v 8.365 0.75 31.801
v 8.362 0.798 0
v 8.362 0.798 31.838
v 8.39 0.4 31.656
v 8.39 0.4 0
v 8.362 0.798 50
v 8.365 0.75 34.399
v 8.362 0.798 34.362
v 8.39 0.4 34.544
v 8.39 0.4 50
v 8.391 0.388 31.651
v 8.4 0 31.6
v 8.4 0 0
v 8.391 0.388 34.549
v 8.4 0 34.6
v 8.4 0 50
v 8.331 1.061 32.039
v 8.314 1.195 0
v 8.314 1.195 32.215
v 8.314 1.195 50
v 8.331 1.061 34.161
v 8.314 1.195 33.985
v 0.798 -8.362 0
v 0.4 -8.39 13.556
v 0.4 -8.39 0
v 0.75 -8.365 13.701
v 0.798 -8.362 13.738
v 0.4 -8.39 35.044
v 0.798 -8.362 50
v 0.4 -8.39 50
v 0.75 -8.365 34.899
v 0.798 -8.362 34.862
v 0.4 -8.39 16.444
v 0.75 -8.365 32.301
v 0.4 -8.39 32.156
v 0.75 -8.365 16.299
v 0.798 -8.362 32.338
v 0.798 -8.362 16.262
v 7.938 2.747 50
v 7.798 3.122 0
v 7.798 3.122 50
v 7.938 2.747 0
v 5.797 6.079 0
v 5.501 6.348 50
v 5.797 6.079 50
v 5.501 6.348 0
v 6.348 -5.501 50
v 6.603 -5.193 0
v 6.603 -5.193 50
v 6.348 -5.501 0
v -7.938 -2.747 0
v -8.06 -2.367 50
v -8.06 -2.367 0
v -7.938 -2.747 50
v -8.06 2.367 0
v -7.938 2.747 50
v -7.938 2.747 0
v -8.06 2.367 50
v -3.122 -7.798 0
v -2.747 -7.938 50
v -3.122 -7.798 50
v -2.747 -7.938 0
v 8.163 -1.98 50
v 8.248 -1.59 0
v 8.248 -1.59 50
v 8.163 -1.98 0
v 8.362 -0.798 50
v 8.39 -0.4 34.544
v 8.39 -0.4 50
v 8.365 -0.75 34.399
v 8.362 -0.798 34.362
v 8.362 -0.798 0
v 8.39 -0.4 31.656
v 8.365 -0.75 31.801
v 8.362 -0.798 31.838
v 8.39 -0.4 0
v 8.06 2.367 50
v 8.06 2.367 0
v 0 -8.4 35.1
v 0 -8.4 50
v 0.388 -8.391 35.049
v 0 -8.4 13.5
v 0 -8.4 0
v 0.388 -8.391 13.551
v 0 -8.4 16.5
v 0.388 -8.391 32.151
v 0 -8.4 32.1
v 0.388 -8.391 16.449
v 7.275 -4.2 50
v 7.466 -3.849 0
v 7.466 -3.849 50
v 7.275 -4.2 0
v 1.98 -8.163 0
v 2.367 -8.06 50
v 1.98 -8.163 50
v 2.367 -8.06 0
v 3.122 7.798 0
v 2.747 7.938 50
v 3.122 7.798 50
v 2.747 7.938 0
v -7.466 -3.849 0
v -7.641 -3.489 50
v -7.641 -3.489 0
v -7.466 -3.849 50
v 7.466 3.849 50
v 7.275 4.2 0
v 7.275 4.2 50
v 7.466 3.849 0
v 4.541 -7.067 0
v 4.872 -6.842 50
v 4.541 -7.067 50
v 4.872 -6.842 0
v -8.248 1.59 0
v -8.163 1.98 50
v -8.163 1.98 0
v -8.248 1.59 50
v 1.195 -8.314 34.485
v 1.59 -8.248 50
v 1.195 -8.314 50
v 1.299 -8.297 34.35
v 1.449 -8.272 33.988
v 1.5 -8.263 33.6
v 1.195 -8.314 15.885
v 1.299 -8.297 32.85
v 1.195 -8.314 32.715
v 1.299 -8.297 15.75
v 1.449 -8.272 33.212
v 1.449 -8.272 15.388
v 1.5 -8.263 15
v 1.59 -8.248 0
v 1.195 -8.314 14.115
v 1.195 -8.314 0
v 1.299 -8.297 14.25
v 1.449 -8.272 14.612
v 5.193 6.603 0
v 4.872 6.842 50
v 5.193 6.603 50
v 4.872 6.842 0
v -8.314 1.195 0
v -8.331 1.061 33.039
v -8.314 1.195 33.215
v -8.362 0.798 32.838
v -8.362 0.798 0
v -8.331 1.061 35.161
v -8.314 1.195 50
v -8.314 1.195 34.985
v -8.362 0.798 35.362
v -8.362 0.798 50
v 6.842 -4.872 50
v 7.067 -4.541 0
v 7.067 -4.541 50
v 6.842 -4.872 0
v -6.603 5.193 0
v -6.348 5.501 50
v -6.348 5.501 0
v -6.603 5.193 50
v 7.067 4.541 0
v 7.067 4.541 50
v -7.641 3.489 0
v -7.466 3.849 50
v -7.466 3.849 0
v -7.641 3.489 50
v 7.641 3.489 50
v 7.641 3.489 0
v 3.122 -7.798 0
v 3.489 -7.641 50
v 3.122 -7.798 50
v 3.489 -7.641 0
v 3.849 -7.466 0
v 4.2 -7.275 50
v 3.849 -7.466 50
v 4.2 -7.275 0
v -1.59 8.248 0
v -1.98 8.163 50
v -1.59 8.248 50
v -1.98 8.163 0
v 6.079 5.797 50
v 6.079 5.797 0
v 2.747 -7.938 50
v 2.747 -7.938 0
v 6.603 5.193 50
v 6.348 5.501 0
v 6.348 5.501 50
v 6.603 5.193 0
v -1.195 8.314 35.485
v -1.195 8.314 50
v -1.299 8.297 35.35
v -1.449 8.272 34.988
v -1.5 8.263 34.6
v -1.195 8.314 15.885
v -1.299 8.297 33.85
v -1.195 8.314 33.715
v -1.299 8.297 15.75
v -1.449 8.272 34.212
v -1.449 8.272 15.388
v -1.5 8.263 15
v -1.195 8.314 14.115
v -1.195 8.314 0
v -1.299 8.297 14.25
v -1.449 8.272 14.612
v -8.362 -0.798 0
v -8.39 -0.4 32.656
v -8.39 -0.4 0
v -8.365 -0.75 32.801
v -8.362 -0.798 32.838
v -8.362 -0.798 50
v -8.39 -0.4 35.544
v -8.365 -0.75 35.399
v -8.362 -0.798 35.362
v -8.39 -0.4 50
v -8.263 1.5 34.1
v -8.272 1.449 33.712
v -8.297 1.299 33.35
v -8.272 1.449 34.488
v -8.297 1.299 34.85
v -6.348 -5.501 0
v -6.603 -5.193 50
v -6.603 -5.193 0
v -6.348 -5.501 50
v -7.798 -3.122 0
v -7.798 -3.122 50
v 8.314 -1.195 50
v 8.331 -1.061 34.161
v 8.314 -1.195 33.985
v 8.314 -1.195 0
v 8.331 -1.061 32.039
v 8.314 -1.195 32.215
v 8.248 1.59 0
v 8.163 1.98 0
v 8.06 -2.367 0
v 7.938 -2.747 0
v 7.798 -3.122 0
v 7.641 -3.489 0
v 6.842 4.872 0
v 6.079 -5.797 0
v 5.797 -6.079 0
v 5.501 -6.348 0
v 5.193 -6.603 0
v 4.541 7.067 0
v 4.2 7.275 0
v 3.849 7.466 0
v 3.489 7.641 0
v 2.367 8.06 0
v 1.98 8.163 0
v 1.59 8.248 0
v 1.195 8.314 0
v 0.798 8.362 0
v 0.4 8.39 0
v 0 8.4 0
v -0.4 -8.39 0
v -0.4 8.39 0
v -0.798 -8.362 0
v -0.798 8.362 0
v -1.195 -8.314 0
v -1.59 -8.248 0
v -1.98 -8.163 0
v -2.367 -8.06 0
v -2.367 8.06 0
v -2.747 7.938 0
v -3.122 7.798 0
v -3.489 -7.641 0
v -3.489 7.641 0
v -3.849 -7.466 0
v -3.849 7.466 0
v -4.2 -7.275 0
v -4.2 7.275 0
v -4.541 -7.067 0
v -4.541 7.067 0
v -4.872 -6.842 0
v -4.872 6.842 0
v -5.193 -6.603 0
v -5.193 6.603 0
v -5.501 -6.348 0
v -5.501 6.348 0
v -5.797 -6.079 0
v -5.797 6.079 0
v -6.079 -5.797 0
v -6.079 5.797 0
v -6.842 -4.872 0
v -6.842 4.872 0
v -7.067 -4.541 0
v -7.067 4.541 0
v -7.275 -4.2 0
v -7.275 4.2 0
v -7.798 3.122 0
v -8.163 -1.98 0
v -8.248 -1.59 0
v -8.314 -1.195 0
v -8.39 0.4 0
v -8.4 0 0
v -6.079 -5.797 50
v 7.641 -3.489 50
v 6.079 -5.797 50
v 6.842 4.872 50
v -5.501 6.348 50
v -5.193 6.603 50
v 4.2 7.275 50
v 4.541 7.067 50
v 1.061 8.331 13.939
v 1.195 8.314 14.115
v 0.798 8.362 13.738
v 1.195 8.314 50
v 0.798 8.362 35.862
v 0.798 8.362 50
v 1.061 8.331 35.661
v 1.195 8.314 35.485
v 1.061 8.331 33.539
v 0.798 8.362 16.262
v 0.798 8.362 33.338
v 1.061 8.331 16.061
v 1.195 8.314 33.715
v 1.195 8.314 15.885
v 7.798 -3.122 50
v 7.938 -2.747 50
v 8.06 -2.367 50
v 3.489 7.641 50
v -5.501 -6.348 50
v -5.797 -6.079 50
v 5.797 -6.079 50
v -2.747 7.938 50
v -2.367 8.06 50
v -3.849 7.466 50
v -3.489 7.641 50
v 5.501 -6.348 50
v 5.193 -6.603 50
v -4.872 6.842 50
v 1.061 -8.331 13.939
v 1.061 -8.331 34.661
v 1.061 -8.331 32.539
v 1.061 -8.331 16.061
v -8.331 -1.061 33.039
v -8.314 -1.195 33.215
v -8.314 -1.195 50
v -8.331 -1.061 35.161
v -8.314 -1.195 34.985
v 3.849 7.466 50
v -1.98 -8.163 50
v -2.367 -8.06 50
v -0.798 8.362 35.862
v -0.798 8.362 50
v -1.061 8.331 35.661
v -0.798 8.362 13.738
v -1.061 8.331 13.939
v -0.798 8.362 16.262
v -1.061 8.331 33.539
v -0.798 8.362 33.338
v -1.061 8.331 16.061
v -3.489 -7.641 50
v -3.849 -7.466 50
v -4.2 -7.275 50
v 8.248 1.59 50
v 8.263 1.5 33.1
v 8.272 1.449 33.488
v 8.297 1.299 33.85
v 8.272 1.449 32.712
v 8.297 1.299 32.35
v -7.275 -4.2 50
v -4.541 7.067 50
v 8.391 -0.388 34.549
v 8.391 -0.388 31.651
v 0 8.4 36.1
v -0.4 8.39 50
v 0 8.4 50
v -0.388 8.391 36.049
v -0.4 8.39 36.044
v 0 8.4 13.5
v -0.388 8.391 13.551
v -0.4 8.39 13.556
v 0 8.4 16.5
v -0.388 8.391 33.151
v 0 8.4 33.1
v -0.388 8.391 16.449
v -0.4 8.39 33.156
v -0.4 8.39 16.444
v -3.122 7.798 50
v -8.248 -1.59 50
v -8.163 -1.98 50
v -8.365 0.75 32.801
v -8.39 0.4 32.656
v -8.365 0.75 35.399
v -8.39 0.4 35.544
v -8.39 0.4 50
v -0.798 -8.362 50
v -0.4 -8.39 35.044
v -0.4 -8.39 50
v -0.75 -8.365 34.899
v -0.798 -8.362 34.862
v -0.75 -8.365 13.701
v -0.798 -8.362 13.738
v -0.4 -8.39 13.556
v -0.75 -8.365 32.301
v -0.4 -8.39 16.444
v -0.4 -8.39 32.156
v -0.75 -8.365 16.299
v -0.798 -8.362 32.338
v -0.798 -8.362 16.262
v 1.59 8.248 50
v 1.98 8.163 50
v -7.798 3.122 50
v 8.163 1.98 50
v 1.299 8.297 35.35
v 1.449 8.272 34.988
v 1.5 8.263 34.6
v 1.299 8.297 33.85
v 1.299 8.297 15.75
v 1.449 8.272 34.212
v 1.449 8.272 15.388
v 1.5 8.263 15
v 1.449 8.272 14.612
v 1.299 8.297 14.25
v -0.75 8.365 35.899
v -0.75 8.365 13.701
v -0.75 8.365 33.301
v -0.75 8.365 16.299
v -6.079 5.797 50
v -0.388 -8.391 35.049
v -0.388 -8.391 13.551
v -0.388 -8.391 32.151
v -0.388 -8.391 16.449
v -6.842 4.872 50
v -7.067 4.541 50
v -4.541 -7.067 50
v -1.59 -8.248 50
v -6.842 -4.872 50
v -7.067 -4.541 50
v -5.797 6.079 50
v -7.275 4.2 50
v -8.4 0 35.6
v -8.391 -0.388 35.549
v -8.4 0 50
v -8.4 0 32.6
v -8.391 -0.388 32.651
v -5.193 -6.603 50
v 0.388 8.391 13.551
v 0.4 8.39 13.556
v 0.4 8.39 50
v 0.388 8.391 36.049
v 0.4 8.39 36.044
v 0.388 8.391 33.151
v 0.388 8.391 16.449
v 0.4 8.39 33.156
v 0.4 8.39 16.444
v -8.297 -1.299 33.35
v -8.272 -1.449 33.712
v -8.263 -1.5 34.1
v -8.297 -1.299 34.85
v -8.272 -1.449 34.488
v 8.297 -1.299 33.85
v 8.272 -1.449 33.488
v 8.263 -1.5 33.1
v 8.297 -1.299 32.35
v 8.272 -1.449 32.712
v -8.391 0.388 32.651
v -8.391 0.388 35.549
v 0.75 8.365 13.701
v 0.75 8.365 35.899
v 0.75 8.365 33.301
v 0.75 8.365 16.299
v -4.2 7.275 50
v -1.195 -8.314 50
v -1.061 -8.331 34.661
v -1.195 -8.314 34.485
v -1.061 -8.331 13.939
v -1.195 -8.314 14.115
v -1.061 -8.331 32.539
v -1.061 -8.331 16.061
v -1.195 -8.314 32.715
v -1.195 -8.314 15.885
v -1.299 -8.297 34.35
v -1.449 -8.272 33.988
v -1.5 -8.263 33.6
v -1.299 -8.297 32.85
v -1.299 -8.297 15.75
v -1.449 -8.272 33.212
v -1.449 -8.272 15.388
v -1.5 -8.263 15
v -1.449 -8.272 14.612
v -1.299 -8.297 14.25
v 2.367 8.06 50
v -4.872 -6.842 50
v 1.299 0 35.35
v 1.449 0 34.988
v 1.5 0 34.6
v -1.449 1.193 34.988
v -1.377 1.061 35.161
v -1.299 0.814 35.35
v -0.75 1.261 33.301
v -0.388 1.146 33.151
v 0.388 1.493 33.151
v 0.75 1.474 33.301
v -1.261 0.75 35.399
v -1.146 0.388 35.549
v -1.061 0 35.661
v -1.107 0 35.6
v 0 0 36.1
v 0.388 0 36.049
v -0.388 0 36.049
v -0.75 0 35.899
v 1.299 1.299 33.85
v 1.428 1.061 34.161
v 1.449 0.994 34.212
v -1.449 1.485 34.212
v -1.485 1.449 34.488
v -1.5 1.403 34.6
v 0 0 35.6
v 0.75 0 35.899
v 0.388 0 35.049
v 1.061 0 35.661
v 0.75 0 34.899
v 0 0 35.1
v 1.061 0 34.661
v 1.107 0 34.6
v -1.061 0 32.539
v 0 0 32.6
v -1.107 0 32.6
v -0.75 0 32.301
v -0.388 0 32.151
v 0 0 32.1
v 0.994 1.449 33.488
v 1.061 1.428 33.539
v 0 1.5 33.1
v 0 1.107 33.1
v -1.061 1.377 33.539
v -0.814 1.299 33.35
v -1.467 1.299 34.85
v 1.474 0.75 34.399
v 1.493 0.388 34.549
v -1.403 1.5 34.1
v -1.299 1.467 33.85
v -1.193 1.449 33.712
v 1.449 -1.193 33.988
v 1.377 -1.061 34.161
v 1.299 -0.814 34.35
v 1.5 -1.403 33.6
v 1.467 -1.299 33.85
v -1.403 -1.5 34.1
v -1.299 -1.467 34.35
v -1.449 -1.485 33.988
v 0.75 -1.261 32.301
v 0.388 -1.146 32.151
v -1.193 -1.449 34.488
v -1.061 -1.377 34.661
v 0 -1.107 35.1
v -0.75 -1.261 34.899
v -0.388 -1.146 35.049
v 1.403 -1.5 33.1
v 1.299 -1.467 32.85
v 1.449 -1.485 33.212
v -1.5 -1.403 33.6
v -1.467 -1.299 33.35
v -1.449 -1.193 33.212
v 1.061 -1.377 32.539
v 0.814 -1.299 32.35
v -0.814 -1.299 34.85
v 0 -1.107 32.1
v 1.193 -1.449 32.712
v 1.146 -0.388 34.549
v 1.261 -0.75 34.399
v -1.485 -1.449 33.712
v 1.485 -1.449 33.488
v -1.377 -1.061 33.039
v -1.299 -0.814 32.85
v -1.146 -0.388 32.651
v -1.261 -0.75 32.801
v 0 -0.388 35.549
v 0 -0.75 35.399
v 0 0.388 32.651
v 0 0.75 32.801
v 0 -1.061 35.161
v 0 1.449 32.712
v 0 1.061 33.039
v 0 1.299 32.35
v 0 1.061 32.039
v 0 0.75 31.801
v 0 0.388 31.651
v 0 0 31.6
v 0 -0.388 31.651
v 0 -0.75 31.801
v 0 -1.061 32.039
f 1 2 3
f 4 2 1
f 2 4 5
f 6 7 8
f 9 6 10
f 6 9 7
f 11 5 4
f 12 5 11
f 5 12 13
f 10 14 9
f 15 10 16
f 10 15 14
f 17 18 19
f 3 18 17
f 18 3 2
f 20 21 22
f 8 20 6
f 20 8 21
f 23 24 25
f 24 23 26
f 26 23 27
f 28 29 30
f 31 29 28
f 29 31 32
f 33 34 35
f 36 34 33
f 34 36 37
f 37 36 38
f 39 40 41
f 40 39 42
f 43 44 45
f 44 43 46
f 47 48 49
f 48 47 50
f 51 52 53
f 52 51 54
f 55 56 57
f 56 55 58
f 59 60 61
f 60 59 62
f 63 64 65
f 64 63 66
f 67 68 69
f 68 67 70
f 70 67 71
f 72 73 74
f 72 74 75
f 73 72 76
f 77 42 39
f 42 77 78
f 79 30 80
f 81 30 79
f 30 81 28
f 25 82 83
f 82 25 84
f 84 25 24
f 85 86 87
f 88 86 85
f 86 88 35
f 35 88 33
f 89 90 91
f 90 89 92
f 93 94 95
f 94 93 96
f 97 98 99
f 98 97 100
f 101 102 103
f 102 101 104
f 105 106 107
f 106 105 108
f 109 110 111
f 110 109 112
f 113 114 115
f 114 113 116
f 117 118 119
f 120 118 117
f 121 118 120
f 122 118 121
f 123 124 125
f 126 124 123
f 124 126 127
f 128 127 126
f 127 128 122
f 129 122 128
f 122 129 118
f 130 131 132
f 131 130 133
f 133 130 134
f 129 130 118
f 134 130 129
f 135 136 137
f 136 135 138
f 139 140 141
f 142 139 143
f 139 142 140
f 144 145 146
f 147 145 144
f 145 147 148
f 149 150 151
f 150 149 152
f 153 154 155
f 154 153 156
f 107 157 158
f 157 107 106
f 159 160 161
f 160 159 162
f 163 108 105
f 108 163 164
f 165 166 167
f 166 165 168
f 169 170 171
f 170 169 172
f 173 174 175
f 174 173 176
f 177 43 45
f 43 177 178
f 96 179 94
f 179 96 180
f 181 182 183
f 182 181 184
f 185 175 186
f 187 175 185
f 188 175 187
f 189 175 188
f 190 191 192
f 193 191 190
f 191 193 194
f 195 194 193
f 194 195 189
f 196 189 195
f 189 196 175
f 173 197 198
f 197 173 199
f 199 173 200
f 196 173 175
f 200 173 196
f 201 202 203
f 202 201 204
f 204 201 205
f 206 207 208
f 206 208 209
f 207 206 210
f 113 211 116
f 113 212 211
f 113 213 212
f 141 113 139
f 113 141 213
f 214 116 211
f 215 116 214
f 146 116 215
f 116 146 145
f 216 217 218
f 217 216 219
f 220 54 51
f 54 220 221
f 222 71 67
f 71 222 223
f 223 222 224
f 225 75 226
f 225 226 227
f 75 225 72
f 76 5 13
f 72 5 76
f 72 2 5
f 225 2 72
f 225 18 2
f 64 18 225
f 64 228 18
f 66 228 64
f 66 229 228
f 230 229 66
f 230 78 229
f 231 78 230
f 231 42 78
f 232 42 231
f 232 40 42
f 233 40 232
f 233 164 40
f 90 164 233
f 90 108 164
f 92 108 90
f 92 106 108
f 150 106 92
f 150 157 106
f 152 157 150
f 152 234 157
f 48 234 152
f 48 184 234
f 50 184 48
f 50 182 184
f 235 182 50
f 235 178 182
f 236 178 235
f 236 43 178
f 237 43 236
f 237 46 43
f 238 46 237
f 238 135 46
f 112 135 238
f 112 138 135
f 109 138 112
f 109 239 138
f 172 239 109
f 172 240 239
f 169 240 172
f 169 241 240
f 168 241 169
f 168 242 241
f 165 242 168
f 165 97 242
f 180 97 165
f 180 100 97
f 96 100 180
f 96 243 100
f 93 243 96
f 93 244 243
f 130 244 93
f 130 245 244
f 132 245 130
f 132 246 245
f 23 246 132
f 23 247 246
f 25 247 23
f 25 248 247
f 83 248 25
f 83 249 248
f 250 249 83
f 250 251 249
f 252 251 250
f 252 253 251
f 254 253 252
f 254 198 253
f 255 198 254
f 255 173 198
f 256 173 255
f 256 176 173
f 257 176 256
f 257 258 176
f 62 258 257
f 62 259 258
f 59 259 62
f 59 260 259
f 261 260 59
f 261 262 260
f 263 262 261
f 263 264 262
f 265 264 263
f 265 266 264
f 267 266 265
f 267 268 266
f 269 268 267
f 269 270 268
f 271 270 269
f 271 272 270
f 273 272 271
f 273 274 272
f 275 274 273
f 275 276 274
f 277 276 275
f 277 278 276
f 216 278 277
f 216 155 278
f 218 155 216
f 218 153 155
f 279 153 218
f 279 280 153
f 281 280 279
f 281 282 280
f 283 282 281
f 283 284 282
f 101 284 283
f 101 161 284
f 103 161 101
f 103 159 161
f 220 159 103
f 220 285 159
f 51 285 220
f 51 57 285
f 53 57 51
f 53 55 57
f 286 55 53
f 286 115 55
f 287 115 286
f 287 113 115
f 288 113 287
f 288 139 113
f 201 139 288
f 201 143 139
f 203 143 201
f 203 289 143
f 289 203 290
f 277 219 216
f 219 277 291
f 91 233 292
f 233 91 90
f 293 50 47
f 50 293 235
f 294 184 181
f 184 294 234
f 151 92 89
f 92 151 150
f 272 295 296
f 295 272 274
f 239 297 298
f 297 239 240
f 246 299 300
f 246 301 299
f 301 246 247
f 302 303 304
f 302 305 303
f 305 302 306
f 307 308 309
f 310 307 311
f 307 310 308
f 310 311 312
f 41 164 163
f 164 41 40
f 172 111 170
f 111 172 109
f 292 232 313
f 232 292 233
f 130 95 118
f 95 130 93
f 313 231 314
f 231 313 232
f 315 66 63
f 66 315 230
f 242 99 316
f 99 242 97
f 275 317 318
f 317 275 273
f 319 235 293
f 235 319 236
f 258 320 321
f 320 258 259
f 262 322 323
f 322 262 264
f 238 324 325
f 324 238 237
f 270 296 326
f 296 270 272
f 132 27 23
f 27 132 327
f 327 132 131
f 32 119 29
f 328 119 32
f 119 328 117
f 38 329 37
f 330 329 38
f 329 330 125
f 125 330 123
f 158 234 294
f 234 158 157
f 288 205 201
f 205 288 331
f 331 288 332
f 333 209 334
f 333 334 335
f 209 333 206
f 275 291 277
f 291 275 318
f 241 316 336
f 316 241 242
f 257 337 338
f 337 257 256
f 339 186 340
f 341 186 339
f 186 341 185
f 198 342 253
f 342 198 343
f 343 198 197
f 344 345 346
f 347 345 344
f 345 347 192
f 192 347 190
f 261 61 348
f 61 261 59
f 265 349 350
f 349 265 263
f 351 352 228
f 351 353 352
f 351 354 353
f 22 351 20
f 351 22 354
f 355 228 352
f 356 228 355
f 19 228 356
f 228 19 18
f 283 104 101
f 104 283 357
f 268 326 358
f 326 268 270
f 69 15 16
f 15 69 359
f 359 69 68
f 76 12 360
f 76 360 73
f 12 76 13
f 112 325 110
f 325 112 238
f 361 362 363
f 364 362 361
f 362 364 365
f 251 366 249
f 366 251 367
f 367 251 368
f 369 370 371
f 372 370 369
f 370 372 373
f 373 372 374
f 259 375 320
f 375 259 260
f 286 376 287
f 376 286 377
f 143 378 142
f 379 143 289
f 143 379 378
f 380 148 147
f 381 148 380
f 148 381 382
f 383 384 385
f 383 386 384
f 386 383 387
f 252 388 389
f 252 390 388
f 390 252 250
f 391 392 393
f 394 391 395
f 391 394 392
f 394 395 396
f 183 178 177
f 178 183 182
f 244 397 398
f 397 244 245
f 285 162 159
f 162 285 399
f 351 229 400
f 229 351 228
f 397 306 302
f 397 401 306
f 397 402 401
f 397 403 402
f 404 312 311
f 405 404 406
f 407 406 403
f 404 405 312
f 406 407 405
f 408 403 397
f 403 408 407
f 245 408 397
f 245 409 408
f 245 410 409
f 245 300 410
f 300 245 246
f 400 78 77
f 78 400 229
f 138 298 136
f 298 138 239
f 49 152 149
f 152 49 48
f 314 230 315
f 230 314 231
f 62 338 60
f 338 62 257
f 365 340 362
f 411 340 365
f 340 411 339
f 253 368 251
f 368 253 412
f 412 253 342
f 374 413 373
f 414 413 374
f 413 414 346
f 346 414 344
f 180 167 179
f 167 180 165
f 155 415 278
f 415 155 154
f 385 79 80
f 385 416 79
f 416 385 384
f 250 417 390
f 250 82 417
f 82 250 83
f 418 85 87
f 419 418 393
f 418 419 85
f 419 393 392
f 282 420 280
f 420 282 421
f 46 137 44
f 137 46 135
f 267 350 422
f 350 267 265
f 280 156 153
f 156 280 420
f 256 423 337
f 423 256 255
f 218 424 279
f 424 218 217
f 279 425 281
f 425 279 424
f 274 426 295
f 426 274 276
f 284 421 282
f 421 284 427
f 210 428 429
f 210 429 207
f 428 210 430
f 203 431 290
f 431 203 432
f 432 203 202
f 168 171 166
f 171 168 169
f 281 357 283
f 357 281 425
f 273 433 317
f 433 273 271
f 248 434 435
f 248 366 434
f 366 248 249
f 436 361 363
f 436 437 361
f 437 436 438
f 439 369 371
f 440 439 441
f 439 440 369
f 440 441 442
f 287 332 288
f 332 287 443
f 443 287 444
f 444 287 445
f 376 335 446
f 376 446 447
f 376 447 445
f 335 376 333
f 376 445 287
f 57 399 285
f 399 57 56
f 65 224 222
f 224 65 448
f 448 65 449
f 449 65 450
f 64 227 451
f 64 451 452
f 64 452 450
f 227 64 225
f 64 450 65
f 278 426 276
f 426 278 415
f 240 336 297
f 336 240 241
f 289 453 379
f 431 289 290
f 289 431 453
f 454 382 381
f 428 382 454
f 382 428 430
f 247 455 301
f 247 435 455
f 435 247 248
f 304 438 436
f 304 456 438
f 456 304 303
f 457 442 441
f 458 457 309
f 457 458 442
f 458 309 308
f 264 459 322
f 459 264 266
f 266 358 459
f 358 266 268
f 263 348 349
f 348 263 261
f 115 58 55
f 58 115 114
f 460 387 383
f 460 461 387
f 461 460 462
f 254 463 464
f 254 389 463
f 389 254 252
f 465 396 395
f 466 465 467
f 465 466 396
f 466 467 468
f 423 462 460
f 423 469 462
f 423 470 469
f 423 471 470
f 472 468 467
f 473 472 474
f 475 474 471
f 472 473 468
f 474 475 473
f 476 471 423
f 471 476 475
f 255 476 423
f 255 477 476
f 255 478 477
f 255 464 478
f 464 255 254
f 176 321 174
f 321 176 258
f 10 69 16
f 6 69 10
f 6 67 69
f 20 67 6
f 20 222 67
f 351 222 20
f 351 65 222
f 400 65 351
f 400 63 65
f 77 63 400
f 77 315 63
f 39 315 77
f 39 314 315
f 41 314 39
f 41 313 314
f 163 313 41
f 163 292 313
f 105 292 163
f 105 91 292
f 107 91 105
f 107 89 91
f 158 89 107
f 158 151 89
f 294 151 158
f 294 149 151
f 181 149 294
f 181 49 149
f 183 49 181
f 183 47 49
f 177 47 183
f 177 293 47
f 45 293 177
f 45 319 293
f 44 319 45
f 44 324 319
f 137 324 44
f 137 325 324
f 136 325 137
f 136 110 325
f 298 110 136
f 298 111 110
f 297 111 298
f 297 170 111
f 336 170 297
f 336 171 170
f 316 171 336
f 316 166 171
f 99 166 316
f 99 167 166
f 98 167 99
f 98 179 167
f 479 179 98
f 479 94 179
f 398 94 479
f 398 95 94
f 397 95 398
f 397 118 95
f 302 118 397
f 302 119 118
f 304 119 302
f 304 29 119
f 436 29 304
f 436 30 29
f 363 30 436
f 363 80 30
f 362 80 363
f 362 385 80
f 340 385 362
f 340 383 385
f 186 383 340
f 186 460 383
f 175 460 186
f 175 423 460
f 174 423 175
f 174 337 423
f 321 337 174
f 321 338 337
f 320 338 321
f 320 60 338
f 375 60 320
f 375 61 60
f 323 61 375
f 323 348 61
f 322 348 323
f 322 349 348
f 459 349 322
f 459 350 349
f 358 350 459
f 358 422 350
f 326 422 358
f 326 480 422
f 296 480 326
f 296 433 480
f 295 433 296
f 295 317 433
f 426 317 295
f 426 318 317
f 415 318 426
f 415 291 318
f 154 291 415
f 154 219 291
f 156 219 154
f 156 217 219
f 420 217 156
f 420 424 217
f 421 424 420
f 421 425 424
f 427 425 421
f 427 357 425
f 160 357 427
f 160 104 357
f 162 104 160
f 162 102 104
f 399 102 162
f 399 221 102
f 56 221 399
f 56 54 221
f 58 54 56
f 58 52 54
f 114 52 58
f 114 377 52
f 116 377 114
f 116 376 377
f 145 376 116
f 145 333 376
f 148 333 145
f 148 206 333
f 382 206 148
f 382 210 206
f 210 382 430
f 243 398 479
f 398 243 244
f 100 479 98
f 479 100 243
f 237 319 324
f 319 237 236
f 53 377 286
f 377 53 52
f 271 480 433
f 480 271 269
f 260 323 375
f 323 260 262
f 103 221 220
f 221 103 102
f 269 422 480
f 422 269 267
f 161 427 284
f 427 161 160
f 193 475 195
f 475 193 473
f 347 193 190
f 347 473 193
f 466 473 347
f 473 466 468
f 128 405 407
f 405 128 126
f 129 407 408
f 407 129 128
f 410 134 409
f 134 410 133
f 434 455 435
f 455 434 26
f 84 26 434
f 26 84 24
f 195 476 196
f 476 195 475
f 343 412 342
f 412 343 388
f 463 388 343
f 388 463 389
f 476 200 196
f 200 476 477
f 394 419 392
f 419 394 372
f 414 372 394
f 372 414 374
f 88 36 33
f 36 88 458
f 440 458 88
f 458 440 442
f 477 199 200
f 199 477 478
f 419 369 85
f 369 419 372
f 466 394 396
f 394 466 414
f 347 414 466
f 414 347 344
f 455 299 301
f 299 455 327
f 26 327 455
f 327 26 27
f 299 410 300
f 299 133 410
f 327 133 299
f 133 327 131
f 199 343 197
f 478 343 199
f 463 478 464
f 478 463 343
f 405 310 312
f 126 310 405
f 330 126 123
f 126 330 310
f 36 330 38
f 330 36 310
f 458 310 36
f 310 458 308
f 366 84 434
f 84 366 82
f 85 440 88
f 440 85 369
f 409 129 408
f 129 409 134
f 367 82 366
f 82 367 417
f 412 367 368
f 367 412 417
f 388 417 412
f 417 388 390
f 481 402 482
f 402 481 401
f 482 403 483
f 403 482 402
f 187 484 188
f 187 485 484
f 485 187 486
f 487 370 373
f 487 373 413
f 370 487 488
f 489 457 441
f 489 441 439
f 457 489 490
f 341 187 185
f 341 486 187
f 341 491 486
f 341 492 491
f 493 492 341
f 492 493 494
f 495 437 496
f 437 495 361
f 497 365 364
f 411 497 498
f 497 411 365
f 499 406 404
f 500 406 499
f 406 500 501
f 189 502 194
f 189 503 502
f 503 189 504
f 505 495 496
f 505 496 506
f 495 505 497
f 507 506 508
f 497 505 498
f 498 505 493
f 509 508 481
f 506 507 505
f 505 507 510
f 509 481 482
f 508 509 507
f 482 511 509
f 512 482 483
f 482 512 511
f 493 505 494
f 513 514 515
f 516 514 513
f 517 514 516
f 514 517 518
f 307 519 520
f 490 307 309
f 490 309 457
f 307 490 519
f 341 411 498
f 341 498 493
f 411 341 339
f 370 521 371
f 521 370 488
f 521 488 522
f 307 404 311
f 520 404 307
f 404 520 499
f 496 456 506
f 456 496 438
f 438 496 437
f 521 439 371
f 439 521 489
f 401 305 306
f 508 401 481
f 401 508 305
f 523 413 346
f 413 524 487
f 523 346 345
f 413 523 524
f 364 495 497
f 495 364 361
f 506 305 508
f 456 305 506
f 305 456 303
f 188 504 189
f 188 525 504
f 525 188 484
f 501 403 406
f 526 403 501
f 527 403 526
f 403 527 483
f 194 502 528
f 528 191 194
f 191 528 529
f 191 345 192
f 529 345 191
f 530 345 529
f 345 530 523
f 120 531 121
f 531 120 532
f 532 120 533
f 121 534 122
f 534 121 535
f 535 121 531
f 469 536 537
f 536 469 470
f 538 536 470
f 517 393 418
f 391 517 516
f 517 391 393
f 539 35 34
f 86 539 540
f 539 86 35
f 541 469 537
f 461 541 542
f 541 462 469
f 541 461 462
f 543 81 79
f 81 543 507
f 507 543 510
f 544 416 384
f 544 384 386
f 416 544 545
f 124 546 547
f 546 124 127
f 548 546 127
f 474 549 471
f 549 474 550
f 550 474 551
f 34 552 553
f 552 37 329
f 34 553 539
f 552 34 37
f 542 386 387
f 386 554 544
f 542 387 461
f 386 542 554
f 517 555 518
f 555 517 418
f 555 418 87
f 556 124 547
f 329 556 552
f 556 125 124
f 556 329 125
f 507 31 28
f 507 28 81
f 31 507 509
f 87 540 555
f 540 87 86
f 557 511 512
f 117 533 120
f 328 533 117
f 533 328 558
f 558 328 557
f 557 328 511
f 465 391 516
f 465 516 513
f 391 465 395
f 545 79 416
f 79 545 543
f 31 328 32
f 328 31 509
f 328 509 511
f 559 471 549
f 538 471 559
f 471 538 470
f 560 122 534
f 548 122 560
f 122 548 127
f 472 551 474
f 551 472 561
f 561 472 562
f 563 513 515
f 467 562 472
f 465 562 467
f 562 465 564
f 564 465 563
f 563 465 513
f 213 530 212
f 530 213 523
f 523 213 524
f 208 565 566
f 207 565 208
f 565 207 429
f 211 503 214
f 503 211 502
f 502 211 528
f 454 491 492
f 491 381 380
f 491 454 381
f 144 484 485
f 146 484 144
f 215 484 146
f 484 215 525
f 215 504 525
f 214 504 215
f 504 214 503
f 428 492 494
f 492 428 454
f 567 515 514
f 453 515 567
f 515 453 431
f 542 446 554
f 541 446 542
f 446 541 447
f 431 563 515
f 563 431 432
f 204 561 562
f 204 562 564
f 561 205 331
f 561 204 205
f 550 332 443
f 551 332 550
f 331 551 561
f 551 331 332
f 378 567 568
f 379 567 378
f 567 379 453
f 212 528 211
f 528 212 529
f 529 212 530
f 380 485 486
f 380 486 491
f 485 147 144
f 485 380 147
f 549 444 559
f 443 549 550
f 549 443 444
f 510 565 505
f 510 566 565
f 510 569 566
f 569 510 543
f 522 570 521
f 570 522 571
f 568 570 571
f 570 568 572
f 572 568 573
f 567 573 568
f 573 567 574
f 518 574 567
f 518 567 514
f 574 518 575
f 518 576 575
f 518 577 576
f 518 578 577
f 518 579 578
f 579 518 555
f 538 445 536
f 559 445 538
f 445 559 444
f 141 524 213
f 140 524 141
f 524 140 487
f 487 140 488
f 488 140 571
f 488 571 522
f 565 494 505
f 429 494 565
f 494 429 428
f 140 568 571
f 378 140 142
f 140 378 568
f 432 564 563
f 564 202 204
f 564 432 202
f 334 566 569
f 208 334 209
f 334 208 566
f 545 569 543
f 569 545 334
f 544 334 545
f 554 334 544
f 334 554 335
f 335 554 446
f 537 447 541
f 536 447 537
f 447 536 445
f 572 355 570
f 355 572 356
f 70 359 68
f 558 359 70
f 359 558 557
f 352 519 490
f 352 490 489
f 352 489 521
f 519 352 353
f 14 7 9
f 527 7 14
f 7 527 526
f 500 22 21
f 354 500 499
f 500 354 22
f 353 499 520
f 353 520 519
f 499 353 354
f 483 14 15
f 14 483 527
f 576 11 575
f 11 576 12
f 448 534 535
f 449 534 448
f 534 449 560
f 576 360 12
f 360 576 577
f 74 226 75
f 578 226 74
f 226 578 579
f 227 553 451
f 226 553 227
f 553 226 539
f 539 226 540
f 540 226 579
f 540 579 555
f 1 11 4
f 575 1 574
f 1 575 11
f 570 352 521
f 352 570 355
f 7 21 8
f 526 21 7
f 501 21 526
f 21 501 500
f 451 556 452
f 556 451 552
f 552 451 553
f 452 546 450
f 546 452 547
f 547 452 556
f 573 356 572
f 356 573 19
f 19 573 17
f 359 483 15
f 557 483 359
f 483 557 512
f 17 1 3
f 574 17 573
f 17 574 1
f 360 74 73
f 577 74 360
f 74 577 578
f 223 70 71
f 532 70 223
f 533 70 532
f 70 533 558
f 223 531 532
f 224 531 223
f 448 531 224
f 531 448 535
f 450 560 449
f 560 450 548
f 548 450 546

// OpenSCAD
$fa = 1;
$fs = 0.4;

D=16.8;

difference() {
    cylinder(d=D, h=50);

    translate([0, 10, 15])
         rotate([90, 0, 0])
         cylinder(d=3, h=20);

    translate([0, D/2, 15+22-2.4])
         rotate([90, 0, 0])
         cylinder(d=3, h=D/2);

    translate([0, 0, 15+22-2.4-1])
         rotate([90, 0, 0])
         cylinder(d=3, h=D/2);

    
    translate([-D/2, 0, 15+22-2.4-0.5])
         rotate([0, 90, 0])
         cylinder(d=3, h=D/2);

    translate([0, 0, 15+22-2.4-1.5])
         rotate([0, 90, 0])
         cylinder(d=3, h=D/2);

}
